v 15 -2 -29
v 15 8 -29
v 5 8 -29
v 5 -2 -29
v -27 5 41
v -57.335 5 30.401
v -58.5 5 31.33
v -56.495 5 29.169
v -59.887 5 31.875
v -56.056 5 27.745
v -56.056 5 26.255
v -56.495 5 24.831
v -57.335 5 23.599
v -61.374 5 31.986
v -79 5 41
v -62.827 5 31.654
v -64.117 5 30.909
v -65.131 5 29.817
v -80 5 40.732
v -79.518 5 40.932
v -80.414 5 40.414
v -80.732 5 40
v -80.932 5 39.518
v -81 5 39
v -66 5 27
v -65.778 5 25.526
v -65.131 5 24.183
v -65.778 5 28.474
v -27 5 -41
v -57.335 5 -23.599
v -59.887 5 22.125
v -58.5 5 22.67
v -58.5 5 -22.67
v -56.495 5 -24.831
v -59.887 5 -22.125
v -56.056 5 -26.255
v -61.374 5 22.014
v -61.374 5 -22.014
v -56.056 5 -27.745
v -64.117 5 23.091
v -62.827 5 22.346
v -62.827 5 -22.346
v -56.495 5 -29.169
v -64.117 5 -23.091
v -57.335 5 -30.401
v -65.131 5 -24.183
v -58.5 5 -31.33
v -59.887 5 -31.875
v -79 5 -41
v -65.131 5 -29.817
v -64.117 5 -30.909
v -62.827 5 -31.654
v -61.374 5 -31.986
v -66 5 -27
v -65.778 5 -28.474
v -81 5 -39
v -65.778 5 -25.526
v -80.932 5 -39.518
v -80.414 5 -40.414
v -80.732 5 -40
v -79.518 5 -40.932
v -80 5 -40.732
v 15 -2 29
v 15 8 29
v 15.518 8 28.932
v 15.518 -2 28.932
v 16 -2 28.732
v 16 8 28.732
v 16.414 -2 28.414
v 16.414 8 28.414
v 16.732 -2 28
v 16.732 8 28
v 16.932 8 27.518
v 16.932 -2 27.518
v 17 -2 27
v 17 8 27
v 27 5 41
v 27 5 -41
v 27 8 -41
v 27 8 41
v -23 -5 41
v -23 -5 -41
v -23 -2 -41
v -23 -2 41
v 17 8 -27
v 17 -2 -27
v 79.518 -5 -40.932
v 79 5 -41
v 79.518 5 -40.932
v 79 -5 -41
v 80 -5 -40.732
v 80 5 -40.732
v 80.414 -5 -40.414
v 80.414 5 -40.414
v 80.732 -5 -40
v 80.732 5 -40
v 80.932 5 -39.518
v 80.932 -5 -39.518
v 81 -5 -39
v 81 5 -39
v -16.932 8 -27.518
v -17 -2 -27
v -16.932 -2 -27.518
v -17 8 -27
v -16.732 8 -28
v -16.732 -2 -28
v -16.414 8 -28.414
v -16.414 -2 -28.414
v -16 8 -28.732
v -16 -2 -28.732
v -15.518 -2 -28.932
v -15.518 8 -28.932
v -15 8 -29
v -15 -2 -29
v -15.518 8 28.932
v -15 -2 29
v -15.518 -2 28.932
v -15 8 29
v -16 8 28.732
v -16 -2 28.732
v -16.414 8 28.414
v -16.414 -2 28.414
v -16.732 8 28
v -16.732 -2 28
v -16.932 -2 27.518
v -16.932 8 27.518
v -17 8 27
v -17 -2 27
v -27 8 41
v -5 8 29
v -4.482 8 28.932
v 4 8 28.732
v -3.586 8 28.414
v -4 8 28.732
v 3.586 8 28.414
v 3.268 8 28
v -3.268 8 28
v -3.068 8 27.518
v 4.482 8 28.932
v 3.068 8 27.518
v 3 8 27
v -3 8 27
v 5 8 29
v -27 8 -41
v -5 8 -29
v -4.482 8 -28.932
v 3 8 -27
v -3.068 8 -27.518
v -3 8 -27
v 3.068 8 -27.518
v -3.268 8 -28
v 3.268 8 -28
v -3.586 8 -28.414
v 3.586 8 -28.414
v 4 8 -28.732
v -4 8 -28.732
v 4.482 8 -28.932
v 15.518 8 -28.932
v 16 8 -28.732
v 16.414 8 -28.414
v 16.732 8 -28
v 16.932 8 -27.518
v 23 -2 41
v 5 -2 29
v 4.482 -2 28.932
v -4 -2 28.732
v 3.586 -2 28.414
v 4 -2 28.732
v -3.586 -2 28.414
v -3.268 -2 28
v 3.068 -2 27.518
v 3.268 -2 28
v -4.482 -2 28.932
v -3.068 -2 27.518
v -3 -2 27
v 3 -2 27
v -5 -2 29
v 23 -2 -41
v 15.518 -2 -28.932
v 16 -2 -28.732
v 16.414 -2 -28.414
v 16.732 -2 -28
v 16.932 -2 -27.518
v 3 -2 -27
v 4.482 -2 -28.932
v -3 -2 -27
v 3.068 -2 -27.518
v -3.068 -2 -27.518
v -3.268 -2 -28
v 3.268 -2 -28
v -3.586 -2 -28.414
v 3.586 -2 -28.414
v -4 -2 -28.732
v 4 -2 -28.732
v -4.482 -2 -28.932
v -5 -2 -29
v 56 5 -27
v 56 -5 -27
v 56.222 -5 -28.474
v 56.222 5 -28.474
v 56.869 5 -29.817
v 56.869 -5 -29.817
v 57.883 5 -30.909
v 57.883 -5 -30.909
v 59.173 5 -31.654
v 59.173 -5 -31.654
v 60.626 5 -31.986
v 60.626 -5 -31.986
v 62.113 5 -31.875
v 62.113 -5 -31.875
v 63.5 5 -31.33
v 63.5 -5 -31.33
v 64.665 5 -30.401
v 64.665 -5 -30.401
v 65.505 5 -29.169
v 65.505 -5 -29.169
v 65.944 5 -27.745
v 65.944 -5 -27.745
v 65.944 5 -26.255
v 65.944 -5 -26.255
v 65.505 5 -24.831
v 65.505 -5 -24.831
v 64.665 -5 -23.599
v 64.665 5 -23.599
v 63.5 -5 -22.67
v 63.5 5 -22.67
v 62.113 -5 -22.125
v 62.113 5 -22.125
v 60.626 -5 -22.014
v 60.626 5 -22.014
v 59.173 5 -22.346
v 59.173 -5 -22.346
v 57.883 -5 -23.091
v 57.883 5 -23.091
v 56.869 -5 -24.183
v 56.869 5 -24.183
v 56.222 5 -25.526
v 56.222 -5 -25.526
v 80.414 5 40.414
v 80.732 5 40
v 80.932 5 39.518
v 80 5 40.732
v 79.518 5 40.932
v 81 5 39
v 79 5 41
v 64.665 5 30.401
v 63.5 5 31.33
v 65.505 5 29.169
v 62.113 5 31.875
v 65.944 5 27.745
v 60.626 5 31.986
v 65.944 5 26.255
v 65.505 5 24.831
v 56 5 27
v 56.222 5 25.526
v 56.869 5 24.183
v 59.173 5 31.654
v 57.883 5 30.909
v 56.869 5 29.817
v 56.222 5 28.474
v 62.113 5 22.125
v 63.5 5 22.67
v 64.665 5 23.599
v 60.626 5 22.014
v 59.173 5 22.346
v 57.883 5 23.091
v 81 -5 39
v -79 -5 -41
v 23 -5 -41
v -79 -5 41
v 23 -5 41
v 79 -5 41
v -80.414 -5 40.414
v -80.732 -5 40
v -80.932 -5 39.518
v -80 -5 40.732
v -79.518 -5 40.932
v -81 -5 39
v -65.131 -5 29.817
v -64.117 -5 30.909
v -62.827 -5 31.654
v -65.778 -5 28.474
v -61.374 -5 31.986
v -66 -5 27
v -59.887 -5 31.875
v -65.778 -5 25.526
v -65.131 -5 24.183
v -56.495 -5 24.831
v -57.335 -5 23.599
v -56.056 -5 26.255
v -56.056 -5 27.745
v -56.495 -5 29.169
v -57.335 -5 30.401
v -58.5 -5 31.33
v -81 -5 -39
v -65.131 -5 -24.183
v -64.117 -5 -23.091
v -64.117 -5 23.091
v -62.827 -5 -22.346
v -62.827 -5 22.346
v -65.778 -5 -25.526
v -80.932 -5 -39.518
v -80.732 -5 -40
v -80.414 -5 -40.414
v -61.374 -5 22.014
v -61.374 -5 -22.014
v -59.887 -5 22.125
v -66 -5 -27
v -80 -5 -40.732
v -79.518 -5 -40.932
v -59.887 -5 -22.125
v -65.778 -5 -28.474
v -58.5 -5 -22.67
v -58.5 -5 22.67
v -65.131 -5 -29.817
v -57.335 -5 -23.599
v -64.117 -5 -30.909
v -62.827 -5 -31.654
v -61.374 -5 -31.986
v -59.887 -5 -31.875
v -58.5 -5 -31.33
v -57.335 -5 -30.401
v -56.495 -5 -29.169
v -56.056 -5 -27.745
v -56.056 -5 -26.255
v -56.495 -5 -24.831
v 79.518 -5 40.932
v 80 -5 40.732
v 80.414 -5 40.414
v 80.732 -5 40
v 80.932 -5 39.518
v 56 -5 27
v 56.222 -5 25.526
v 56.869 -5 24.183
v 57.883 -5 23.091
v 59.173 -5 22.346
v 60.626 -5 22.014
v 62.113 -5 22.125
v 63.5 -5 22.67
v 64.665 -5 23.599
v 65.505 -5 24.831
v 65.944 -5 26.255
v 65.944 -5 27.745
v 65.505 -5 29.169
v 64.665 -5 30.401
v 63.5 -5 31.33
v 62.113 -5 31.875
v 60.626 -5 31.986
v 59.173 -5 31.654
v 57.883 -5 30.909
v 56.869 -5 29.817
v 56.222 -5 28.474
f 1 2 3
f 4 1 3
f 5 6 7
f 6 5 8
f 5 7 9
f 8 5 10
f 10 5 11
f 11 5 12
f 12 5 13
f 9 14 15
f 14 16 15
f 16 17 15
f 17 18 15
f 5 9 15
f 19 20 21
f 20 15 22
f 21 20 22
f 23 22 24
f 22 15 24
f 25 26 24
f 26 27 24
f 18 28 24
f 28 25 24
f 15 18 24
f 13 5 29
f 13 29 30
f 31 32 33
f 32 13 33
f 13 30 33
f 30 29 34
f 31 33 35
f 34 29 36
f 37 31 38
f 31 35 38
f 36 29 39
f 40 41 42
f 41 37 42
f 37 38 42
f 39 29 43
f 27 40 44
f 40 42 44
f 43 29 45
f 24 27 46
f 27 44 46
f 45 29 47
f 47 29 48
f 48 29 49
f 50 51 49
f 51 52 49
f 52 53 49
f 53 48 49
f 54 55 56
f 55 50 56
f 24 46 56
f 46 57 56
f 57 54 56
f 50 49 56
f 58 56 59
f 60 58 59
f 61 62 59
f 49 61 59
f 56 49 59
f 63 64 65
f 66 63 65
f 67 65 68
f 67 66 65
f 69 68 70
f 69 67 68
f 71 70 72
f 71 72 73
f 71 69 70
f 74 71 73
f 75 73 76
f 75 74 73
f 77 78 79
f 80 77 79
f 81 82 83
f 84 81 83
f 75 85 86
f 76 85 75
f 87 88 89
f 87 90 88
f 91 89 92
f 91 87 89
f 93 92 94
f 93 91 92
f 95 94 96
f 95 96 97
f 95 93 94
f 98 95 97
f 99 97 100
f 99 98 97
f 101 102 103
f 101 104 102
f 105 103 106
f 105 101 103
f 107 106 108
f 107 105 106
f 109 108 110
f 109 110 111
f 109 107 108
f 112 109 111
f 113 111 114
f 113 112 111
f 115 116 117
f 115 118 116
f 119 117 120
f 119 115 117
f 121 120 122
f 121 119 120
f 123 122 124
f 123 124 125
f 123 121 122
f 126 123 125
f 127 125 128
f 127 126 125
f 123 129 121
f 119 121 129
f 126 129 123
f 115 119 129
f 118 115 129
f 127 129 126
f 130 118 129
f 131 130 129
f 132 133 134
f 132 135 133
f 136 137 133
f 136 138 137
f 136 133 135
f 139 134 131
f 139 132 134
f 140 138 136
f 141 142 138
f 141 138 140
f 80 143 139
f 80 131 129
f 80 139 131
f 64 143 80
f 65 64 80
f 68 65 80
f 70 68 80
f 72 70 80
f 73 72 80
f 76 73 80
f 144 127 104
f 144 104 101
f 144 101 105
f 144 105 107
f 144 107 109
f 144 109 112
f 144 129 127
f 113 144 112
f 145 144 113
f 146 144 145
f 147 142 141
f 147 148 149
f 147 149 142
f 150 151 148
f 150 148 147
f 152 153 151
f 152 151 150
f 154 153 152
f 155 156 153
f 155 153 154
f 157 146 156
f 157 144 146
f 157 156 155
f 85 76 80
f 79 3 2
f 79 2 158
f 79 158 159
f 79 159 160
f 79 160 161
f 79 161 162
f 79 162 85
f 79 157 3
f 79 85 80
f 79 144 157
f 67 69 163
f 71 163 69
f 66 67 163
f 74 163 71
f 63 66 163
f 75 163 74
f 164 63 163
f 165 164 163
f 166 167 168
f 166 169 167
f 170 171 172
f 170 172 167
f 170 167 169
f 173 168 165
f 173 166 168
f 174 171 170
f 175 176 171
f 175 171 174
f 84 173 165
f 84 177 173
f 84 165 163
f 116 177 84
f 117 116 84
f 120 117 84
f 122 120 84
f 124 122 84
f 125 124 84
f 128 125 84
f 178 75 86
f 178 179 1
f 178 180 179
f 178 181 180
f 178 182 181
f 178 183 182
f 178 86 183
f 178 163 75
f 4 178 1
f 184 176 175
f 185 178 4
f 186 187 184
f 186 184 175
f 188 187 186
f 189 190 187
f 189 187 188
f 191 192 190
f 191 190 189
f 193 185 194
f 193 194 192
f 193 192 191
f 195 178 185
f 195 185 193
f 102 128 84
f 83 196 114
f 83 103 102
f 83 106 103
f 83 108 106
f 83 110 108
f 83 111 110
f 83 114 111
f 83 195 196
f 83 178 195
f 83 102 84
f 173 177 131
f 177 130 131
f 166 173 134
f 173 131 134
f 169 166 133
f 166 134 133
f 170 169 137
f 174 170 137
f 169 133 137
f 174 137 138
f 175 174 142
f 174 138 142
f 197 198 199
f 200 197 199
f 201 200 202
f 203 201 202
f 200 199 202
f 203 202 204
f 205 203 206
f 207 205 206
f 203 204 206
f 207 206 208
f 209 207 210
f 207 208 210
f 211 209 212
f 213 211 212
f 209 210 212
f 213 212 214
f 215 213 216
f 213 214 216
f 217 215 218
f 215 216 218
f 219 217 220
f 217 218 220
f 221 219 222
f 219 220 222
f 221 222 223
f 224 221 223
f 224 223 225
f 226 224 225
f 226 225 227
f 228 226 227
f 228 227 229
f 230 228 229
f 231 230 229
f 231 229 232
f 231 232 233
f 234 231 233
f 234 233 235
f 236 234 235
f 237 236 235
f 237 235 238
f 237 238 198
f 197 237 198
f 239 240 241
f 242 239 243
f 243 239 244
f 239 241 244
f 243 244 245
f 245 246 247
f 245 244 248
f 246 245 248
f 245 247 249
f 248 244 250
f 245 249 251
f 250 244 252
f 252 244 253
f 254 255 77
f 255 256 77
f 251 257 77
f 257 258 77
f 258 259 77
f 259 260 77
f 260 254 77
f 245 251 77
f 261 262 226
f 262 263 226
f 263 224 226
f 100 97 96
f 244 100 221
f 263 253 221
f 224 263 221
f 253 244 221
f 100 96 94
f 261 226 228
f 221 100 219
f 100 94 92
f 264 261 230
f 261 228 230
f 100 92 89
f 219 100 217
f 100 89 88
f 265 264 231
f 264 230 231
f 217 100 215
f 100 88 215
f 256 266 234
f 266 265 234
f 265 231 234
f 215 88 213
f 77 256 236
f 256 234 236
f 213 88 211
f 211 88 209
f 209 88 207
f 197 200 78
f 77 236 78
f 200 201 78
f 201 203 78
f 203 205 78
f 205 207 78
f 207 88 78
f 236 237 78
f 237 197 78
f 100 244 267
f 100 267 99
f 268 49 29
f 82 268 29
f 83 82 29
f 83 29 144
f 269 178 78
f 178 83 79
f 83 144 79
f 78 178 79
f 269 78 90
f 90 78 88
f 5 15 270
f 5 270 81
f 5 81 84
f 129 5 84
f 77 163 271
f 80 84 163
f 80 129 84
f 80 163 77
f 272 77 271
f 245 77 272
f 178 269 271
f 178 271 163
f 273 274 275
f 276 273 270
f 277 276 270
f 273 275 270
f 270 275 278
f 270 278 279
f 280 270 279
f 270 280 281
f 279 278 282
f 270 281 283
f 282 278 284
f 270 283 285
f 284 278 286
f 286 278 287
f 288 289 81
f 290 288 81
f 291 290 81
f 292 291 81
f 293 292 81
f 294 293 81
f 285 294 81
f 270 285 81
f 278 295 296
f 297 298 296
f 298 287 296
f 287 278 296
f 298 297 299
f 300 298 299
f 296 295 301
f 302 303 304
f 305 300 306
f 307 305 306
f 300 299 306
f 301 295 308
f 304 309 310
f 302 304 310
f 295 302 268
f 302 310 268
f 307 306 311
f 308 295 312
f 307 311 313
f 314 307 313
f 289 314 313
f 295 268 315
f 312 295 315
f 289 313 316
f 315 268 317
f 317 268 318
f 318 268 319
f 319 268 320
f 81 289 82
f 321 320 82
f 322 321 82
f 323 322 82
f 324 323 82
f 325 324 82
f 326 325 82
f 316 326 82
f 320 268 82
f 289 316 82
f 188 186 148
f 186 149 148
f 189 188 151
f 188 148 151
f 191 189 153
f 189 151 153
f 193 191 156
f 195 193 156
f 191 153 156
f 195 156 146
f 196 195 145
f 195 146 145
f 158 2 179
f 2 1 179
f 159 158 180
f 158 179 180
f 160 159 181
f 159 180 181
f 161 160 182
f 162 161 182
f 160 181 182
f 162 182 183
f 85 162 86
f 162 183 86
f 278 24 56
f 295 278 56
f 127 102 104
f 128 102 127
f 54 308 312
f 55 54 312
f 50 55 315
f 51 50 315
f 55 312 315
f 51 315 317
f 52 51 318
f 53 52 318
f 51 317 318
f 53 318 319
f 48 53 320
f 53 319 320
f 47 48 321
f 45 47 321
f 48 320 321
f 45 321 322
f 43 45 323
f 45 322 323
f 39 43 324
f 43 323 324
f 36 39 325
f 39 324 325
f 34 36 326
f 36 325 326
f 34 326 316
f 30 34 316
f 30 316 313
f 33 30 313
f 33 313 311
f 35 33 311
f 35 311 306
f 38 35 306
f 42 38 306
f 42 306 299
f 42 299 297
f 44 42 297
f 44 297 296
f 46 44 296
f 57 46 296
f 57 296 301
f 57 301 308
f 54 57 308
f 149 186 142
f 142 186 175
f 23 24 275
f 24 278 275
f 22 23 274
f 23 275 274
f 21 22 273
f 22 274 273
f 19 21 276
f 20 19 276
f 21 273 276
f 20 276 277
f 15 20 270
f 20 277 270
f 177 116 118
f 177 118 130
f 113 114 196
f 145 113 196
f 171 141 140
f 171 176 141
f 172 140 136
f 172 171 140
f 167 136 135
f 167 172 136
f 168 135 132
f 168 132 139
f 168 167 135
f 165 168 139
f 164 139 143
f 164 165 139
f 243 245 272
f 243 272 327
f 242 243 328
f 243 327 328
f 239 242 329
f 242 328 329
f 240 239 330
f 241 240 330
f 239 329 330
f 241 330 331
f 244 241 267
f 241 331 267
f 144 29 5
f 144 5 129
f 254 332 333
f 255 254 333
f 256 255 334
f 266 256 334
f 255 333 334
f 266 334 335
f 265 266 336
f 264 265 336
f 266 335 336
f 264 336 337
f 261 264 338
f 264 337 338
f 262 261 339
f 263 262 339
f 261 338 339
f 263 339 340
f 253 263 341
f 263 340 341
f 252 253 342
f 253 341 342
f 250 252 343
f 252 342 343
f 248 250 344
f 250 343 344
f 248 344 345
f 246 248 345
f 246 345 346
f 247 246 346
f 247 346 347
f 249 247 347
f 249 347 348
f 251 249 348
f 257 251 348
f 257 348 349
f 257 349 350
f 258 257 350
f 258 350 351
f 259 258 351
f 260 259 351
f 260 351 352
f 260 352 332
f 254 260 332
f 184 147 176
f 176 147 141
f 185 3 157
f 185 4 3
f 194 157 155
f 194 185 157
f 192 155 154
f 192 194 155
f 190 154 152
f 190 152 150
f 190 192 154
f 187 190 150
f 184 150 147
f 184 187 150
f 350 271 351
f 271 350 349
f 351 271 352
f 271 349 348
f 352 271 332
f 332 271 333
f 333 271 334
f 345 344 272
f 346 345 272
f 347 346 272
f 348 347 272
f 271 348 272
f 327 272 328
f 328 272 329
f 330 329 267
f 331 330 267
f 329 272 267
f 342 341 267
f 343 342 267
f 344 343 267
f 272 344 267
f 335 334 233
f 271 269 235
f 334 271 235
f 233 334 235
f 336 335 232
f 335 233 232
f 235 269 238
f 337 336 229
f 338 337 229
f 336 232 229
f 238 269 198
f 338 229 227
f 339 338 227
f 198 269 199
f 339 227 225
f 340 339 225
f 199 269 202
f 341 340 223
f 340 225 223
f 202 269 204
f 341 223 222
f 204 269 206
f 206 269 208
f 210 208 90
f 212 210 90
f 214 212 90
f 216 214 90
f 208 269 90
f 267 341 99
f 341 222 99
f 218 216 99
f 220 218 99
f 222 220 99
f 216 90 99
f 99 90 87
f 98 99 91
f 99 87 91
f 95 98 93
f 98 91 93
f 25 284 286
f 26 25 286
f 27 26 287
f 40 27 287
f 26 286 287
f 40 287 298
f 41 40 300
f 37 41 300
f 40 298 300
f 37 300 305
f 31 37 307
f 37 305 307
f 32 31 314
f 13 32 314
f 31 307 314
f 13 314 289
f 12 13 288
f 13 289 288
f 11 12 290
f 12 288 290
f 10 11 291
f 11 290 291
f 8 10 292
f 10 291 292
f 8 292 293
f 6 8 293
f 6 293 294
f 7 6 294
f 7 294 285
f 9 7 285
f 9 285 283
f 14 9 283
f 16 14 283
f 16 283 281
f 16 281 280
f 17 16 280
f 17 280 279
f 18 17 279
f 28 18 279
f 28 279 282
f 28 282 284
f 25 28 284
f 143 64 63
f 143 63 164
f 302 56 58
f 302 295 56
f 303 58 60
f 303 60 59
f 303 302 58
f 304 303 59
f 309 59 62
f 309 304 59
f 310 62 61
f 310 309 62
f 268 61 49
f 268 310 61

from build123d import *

# Parameters (mm, degrees)
SKETCH1_W                   = 162
SKETCH1_H                   = 82
BOSS_EXTRUDE1_DEPTH         = 13
SKETCH2_W                   = 54
SKETCH2_H                   = 3
CUT_EXTRUDE1_DEPTH          = 83
SKETCH3_W                   = 54
SKETCH3_H                   = 3
CUT_EXTRUDE2_DEPTH          = 83
SKETCH4_W                   = 46
SKETCH4_H                   = 3
CUT_EXTRUDE3_DEPTH          = 83
SKETCH5_W                   = 14
SKETCH5_H                   = 58
CUT_EXTRUDE4_DEPTH          = 11
SKETCH6_W                   = 14
SKETCH6_H                   = 58
CUT_EXTRUDE5_DEPTH          = 14
F_3_8_CLEARANCE_HOLE1_D     = 10
F_3_8_CLEARANCE_HOLE1_DEPTH = 10
FILLET1_R                   = 2


with BuildPart() as part:
    # Sketch1 → Boss-Extrude1 (new body)
    with BuildSketch(Plane(origin=(0, 8, 0), x_dir=(1, 0, 0), z_dir=(0, 1, 0))):
        Rectangle(SKETCH1_W, SKETCH1_H)
    extrude(amount=-BOSS_EXTRUDE1_DEPTH)

    # Sketch2 → Cut-Extrude1 (cut, through all)
    with BuildSketch(Plane(origin=(0, 0, -41), x_dir=(-1, 0, 0), z_dir=(0, 0, -1))):
        with Locations((-54, 6.5)):
            Rectangle(SKETCH2_W, SKETCH2_H)
    extrude(amount=-CUT_EXTRUDE1_DEPTH, mode=Mode.SUBTRACT)

    # Sketch3 → Cut-Extrude2 (cut, through all)
    with BuildSketch(Plane(origin=(0, 0, -41), x_dir=(-1, 0, 0), z_dir=(0, 0, -1))):
        with Locations((54, 6.5)):
            Rectangle(SKETCH3_W, SKETCH3_H)
    extrude(amount=-CUT_EXTRUDE2_DEPTH, mode=Mode.SUBTRACT)

    # Sketch4 → Cut-Extrude3 (cut, through all)
    with BuildSketch(Plane(origin=(0, 0, -41), x_dir=(-1, 0, 0), z_dir=(0, 0, -1))):
        with Locations((0, -3.5)):
            Rectangle(SKETCH4_W, SKETCH4_H)
    extrude(amount=-CUT_EXTRUDE3_DEPTH, mode=Mode.SUBTRACT)

    # Sketch5 → Cut-Extrude4 (cut, through all)
    with BuildSketch(Plane.XZ.offset(2)):
        with Locations((-10, 0)):
            Rectangle(SKETCH5_W, SKETCH5_H)
    extrude(amount=-CUT_EXTRUDE4_DEPTH, mode=Mode.SUBTRACT)

    # Sketch6 → Cut-Extrude5 (cut, through all)
    with BuildSketch(Plane(origin=(0, 8, 0), x_dir=(-1, 0, 0), z_dir=(0, 1, 0))):
        with Locations((-10, 0)):
            Rectangle(SKETCH6_W, SKETCH6_H)
    extrude(amount=-CUT_EXTRUDE5_DEPTH, mode=Mode.SUBTRACT)

    # 3/8 Clearance Hole1
    with Locations(Plane(origin=(0, 5, 0), x_dir=(1, 0, 0), z_dir=(0, 1, 0))):
        with Locations((-61, 27), (61, 27), (-61, -27), (61, -27)):
            Hole(F_3_8_CLEARANCE_HOLE1_D / 2, depth=F_3_8_CLEARANCE_HOLE1_DEPTH)

    # Fillet1
    fillet1_edges = [part.edges().sort_by_distance(p)[0] for p in [
        (-3, 3, 29),
        (-3, 3, -29),
        (-17, 3, -29),
        (-17, 3, 29),
        (3, 3, -29),
        (81, 0, 41),
        (17, 3, -29),
        (17, 3, 29),
        (3, 3, 29),
        (-81, 0, 41),
        (-81, 0, -41),
        (81, 0, -41),
    ]]
    fillet(fillet1_edges, radius=FILLET1_R)


solid = part.part
